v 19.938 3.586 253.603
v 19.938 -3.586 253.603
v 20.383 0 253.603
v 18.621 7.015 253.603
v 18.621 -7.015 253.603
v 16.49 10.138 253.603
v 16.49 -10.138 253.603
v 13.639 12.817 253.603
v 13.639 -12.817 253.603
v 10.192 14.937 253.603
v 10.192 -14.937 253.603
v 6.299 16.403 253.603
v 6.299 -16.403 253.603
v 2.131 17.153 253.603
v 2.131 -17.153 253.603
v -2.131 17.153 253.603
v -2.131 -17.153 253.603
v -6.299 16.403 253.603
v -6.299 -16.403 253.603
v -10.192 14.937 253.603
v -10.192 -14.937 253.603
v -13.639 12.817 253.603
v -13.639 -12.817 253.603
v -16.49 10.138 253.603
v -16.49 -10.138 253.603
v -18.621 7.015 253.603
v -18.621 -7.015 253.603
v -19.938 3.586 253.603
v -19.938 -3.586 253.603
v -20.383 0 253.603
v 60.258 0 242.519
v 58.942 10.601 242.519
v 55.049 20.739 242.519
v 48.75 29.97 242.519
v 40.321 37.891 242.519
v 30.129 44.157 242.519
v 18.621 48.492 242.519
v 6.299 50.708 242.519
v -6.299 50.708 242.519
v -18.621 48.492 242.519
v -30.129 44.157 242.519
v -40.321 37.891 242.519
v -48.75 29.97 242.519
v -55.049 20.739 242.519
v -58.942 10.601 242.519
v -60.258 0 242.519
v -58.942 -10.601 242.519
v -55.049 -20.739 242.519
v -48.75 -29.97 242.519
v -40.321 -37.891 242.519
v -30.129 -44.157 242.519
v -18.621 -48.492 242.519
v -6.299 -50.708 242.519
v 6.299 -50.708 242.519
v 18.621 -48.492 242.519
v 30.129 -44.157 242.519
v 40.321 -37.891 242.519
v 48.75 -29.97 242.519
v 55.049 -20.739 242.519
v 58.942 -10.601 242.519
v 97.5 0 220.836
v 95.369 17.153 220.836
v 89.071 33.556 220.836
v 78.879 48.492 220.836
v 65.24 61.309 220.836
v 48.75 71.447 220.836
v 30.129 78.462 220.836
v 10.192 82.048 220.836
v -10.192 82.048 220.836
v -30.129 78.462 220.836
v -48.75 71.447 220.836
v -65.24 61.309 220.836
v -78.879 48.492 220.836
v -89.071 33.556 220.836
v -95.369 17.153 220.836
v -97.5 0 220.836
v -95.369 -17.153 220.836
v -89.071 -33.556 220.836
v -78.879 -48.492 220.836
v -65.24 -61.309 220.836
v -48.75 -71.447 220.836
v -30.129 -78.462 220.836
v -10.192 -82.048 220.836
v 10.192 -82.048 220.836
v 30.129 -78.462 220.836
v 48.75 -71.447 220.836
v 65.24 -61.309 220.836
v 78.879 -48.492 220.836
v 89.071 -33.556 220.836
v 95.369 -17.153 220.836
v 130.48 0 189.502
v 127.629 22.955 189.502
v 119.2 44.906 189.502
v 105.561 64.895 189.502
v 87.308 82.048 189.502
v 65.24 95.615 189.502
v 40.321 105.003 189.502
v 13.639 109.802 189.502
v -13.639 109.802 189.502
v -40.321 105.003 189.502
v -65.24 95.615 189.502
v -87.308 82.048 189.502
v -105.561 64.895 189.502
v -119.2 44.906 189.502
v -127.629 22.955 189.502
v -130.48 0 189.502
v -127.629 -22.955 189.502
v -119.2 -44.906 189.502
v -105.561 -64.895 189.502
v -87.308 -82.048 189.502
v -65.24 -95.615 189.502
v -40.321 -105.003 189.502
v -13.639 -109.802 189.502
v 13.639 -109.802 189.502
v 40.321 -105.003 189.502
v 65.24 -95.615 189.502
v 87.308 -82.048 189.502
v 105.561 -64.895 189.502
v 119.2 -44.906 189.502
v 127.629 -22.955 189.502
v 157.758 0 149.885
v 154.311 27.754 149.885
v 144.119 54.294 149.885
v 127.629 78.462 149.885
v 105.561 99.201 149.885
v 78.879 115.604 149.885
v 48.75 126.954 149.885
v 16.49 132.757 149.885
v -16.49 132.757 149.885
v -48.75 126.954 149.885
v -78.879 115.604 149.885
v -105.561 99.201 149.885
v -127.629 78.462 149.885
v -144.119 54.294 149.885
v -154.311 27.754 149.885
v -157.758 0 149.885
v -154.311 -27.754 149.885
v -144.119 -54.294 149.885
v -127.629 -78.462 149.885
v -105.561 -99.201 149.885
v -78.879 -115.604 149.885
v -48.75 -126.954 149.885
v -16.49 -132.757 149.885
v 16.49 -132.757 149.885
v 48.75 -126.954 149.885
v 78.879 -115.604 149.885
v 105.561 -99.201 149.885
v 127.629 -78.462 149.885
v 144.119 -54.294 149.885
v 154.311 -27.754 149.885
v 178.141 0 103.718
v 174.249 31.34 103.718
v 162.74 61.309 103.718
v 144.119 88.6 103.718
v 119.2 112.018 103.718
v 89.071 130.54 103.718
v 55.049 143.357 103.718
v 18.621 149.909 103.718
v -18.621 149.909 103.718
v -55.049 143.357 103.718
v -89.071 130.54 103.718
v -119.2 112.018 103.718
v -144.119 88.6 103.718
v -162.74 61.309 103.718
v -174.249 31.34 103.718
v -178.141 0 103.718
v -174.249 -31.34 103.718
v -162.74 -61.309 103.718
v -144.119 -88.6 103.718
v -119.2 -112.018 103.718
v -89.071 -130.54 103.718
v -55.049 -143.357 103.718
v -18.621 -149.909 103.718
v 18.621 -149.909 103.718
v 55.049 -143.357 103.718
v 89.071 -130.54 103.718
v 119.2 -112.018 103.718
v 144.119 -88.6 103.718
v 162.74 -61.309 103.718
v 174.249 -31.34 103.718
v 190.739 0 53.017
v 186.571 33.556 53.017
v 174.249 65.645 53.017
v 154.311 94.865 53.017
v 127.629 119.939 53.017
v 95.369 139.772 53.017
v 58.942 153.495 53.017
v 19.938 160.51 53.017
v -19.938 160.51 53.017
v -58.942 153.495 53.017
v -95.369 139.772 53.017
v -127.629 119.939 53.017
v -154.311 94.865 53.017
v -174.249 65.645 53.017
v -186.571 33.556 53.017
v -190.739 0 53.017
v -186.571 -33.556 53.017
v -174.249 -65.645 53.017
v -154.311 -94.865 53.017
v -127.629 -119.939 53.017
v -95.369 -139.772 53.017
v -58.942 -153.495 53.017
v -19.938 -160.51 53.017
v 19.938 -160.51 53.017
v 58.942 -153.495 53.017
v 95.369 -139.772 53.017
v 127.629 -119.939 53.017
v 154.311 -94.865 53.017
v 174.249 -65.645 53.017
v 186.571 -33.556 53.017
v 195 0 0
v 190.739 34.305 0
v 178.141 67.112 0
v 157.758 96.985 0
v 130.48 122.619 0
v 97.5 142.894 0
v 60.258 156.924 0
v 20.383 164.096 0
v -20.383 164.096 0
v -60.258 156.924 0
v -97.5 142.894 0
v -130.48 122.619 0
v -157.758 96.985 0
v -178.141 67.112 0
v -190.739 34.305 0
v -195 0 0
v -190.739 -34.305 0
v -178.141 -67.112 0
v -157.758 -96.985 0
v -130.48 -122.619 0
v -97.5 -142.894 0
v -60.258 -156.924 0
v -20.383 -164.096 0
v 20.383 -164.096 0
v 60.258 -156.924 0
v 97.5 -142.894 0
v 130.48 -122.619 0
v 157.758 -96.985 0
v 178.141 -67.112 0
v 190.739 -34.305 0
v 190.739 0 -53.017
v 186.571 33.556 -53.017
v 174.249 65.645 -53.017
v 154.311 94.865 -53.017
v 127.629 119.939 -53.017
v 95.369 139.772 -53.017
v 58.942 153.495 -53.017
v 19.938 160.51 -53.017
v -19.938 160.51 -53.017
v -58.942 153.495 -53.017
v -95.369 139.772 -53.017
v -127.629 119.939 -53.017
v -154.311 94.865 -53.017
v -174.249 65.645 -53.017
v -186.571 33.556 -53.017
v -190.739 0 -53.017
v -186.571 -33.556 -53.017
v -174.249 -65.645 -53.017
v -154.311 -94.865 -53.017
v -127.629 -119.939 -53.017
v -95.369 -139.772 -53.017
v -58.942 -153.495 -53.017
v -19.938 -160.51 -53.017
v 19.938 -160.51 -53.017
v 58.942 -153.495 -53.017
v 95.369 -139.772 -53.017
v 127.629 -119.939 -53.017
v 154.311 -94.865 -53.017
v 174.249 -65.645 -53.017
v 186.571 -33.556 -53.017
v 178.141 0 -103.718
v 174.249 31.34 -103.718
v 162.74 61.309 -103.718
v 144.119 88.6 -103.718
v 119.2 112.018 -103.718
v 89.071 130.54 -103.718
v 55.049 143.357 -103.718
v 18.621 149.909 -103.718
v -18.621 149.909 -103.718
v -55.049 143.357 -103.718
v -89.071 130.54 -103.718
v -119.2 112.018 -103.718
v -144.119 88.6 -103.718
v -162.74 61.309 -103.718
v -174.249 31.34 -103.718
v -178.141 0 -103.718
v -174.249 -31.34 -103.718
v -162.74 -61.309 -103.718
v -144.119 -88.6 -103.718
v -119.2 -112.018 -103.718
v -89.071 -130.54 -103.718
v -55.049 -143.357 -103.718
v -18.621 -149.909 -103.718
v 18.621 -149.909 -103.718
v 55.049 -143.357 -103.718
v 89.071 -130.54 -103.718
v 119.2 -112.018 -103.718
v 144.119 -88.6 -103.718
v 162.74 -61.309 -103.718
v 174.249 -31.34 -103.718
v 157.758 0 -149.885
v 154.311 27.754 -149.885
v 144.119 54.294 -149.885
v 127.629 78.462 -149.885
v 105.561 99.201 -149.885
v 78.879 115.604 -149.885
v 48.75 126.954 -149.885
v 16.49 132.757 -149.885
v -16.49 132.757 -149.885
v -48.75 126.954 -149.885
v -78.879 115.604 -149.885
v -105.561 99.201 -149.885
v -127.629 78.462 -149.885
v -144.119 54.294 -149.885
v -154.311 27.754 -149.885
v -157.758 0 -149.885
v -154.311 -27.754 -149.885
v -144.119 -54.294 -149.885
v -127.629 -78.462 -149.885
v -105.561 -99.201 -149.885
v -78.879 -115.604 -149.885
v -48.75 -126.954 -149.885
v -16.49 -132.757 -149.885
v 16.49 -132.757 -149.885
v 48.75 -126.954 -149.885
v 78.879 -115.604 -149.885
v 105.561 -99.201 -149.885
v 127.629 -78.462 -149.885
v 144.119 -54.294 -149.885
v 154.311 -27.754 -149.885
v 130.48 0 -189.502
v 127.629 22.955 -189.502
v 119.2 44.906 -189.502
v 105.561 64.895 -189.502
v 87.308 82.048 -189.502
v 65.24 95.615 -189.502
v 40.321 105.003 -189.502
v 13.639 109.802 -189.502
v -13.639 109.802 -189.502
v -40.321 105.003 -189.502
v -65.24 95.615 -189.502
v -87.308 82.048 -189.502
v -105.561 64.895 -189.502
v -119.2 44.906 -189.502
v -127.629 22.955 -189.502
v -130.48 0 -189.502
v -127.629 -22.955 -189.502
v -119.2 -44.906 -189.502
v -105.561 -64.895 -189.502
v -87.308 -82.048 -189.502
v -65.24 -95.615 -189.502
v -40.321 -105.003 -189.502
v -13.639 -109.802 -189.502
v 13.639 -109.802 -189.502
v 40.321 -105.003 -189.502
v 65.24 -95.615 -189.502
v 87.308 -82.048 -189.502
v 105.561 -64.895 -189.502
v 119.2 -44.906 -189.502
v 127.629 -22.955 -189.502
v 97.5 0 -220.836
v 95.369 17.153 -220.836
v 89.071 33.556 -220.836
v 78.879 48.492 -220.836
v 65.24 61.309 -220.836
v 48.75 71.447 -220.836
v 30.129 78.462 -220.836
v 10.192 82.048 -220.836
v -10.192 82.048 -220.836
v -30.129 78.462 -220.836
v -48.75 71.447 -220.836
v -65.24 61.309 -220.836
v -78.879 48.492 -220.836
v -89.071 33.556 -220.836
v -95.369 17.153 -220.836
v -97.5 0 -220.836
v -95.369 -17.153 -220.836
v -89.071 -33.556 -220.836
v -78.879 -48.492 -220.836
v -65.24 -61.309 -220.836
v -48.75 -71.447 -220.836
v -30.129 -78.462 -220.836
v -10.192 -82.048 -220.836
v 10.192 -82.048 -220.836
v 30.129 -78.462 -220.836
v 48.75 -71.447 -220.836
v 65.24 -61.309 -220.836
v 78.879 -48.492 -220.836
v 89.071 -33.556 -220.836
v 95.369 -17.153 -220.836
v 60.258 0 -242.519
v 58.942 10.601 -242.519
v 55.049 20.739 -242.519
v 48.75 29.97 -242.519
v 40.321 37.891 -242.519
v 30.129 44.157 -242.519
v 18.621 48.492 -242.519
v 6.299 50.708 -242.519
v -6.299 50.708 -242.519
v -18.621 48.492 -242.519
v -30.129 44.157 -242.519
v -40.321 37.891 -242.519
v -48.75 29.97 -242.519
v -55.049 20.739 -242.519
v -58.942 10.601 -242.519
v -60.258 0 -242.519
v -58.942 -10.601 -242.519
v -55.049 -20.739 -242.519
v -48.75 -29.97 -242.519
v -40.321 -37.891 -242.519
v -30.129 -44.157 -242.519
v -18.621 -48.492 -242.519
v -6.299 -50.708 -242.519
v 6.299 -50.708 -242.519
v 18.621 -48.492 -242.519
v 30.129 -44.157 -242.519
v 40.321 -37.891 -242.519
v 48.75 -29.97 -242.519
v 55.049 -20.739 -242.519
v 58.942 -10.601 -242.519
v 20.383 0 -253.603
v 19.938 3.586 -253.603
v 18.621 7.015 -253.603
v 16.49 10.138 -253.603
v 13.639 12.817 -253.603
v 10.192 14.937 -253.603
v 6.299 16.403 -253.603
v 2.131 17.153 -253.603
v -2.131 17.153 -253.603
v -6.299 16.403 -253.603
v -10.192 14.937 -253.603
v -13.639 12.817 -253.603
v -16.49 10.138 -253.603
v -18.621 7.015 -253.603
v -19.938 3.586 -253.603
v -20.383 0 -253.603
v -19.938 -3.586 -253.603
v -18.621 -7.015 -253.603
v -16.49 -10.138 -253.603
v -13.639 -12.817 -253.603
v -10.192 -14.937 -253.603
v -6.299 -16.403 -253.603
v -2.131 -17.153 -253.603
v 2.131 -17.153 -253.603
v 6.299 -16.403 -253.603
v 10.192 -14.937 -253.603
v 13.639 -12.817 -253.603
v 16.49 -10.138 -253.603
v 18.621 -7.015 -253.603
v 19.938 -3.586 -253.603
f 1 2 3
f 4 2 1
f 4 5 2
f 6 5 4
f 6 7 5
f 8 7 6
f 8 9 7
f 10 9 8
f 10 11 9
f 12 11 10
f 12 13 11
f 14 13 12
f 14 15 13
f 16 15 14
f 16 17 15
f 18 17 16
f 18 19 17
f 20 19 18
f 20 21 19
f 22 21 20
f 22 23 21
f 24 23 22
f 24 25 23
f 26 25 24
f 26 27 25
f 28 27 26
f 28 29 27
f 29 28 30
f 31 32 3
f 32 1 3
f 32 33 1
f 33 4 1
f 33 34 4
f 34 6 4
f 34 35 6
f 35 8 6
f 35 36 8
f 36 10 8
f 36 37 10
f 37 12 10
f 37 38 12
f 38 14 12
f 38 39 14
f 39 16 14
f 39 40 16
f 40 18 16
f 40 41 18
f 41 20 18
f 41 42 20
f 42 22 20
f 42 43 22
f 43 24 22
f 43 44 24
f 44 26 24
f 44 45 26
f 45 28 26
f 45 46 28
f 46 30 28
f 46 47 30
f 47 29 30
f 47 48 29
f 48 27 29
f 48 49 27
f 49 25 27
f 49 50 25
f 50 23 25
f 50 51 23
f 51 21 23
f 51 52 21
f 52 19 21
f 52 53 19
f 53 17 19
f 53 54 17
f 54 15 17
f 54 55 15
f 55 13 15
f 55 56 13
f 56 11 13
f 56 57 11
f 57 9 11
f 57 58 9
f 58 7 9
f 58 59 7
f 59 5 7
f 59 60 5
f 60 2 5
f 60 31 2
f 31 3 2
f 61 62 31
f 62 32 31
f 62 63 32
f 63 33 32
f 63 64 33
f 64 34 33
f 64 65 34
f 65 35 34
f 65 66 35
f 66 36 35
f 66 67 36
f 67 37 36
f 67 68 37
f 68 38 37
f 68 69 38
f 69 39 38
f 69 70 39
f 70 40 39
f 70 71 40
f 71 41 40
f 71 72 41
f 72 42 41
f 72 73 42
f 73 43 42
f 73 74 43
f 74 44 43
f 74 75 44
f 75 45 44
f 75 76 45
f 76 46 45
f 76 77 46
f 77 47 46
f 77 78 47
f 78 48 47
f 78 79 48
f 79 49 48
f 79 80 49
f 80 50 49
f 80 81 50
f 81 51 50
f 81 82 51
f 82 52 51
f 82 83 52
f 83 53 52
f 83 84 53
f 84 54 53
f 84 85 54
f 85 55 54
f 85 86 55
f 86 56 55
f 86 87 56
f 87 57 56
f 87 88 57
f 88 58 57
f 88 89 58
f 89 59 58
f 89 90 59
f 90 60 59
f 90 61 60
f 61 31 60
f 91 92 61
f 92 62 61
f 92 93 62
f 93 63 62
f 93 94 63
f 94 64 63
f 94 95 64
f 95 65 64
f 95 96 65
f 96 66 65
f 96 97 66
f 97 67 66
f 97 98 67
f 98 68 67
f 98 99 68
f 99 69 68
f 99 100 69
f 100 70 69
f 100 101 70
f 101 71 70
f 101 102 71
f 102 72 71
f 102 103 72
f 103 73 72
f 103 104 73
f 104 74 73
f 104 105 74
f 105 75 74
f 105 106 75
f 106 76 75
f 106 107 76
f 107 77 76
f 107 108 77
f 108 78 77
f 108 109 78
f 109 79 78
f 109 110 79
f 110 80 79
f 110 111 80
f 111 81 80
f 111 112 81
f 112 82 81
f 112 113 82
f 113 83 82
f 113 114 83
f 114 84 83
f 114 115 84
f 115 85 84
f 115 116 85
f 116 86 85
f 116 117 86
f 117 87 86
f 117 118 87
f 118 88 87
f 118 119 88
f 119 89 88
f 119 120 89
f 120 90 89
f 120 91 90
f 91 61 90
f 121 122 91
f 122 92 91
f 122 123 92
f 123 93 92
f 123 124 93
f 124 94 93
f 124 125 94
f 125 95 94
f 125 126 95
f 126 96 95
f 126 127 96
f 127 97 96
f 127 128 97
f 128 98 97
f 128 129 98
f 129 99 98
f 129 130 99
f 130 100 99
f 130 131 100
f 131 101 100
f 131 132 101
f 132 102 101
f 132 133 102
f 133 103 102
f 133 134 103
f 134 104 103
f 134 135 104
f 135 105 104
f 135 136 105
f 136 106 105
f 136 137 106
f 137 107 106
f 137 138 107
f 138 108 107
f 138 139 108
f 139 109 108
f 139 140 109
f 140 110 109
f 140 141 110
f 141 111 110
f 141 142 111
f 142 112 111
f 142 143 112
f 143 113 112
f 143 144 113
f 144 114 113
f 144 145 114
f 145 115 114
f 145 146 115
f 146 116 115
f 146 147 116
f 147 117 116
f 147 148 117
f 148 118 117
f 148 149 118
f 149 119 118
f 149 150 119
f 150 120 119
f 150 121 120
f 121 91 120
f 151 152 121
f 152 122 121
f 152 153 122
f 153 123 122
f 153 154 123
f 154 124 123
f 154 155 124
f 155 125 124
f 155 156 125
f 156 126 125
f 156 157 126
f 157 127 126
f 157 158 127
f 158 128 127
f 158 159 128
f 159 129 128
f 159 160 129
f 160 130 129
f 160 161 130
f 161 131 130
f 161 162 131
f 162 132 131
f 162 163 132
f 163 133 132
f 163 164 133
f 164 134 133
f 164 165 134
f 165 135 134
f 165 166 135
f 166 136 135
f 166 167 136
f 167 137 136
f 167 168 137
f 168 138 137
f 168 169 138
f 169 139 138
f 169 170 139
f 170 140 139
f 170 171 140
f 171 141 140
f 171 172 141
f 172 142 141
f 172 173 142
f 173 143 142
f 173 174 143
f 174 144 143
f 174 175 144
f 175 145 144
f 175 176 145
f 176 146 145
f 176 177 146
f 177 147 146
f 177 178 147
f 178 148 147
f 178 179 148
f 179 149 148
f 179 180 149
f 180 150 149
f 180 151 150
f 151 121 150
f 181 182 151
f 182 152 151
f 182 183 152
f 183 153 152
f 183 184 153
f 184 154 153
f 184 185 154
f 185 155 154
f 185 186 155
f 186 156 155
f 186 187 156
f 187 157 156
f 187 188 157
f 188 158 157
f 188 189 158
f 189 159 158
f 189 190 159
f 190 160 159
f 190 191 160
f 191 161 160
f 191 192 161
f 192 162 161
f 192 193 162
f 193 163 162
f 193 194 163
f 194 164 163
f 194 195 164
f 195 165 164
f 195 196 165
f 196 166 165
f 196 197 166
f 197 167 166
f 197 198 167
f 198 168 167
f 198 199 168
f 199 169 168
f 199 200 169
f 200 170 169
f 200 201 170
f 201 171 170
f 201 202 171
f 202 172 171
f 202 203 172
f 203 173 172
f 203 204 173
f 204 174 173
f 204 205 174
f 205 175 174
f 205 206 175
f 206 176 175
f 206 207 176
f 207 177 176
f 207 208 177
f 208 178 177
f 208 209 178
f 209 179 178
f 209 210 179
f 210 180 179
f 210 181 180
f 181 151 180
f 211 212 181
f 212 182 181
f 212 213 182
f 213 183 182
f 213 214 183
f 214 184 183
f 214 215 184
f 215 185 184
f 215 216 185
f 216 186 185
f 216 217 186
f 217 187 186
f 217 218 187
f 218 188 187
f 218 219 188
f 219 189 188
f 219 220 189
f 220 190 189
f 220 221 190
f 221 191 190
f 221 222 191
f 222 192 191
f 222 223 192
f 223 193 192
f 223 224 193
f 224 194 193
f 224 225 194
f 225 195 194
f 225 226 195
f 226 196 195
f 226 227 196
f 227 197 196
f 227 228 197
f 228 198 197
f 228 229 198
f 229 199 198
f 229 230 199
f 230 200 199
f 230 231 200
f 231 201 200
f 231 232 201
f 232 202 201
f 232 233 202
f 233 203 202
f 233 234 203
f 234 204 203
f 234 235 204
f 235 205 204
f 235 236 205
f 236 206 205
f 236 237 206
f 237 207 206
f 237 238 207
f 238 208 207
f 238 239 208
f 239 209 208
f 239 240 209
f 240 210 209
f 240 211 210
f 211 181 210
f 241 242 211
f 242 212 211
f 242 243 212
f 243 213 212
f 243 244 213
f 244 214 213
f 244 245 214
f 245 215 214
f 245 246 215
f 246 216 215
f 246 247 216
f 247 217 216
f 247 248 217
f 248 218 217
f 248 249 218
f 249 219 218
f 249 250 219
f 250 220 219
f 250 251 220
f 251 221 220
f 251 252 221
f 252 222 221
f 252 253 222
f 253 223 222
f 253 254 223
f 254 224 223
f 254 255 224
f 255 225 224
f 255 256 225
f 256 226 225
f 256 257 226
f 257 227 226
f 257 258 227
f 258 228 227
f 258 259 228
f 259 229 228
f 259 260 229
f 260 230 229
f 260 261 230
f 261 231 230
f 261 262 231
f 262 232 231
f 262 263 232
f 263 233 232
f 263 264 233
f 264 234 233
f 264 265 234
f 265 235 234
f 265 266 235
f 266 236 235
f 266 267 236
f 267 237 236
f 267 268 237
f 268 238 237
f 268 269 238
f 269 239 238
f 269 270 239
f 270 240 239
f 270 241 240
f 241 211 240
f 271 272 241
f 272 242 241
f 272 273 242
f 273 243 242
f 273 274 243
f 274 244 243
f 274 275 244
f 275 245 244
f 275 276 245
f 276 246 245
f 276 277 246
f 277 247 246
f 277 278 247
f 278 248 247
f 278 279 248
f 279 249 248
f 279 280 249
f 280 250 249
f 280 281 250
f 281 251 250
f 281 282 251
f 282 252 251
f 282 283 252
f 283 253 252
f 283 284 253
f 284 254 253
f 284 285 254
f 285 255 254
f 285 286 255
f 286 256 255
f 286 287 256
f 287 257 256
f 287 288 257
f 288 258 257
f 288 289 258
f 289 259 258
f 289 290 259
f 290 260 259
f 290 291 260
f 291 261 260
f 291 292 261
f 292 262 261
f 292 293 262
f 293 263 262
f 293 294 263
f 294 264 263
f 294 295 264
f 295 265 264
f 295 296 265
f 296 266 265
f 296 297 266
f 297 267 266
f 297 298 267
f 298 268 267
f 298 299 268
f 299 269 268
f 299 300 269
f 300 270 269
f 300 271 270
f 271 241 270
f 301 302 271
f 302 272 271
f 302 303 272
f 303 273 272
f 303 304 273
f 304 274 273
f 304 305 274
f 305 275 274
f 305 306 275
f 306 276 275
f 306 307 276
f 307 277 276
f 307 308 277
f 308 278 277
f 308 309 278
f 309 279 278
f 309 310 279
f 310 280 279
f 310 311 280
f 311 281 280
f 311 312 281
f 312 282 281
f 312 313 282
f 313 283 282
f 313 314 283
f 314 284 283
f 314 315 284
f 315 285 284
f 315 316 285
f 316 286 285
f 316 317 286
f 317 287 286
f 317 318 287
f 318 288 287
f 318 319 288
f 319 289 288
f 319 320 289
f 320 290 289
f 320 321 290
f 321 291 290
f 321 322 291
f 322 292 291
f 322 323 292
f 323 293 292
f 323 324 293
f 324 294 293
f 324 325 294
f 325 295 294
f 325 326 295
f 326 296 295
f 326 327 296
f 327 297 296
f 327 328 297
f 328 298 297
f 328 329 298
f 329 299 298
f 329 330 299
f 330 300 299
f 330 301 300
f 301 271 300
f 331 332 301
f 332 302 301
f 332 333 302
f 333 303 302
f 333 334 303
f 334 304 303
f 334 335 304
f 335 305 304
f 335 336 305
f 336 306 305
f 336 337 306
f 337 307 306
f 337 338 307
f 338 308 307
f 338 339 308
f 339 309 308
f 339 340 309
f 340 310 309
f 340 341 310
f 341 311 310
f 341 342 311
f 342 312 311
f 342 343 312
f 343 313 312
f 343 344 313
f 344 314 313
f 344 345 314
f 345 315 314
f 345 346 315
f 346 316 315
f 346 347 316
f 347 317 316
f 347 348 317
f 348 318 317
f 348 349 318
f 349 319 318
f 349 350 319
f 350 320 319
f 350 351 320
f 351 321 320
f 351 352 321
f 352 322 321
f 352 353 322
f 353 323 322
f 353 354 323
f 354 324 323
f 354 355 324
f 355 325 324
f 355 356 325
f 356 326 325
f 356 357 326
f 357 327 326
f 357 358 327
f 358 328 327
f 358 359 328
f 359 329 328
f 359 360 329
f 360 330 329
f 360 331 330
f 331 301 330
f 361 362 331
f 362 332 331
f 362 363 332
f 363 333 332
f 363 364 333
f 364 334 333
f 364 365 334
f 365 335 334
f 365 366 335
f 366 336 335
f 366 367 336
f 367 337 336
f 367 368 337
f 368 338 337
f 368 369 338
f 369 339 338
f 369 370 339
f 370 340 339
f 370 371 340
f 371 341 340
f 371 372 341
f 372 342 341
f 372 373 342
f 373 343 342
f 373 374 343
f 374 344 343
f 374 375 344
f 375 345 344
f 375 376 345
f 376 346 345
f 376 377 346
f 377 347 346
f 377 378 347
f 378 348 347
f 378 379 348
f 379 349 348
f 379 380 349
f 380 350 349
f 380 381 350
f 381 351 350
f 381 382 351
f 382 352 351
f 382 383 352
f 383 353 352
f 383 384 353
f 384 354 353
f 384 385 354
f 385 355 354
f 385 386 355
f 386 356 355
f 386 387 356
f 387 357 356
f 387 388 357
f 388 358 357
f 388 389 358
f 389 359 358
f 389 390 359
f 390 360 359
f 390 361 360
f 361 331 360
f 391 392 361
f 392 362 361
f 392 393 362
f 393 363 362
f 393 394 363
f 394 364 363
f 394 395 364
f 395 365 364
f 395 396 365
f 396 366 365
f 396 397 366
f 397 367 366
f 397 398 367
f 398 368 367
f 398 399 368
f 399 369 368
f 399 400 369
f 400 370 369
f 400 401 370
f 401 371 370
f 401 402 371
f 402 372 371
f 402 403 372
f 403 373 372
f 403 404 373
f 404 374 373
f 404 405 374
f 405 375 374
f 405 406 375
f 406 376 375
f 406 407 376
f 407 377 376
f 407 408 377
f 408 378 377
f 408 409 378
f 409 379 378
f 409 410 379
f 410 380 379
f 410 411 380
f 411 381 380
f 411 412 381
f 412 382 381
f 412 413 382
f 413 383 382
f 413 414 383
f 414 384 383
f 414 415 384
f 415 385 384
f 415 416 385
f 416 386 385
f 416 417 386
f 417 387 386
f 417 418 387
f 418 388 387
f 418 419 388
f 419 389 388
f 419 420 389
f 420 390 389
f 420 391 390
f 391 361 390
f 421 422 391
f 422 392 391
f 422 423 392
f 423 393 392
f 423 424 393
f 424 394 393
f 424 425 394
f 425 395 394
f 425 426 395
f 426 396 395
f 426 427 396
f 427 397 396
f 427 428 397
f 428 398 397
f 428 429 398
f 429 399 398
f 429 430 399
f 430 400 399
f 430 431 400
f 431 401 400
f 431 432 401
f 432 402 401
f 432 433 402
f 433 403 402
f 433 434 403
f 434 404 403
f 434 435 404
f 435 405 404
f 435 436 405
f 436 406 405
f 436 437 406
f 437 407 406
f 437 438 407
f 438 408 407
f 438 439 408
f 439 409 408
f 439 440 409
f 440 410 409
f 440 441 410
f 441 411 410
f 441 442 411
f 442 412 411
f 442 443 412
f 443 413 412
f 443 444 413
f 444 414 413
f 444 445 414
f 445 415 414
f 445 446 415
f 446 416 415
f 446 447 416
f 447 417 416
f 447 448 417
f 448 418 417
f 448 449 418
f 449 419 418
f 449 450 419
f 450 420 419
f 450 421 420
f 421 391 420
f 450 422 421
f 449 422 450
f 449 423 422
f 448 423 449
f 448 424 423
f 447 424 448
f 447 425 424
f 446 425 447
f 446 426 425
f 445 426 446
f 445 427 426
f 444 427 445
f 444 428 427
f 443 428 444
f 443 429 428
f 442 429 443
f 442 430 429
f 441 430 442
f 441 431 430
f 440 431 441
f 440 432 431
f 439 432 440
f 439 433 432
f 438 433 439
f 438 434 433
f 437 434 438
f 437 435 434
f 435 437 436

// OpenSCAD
// Generated by SolidPython 1.0.1 on 2020-07-29 00:46:51


scale(v = [13, 11, 17]) {
	sphere(r = 15);
}
/***********************************************
*********      SolidPython code:      **********
************************************************
 
# import packages: SolidPython
from solid import *
from solid.utils import *
from itertools import chain, combinations, permutations


class Resize:

    def __init__(self, scad_file):
        self.scad_file = scad_file
        #self.scad_file = import_scad(scad_file)
        # cone/cylinder param:
        self.r1 = 0
        self.r2 = 0
        self.h = 0
        # rectangular prism param:
        self.w = 0
        self.l = 0
        # ellipse param:
        self.r = 0

    # import OpenScad code (file name corresponds to shape)


    # classify shape + parameters
    def assign(self, param1, param2, param3):
        if self.scad_file == 'cone.scad':
            self.r1 = param1
            self.r2 = param2
            self.h = param3
        elif self.scad_file == 'cylinder.scad':
            self.r1 = param1
            self.r2 = param2
            self.h = param3
        elif self.scad_file == 'rectangularPrism.scad':
            self.h = param1
            self.l = param2
            self.w = param3
        else:
            self.r = param1
            self.h = param2

    # resize parameters
    def iterate(self):
        x = range(3, 20, 2)
        i = 1
        if self.scad_file == 'cone.scad':
            tempList = list(permutations(x, 2))
            for temp in tempList:
                param1 = temp[0]
                param2 = temp[1]
                filepath = 'produced_scad_files/' + 'cone' + str(param1) + '_' + str(param2) + '_' + '.scad'
                scad_render_to_file(cylinder(h=param1, r1=param2, r2=0), filepath)

        elif self.scad_file == 'cylinder.scad':
            tempList = list(permutations(x, 3))
            for temp in tempList:
                param1 = temp[0]
                param2 = temp[1]
                filepath = 'produced_scad_files/' + 'cylinder' + str(param1) + '_' + str(param2) + '_' + '.scad'
                scad_render_to_file(cylinder(h=param1, r1=param2, r2=param2), filepath)

        elif self.scad_file == 'rectangularPrism.scad':
            tempList = list(permutations(x, 3))
            for temp in tempList:
                param1 = temp[0]
                param2 = temp[1]
                param3 = temp[2]
                filepath = 'produced_scad_files/' + 'rectangularPrism' + str(param1) + '_' + str(param2) + '_' + str(
                    param3) + '.scad'
                scad_render_to_file(cube(size=(param1, param2, param3)), filepath)

        elif self.scad_file == 'ellipse.scad':
            tempList = list(permutations(x, 4))
            for temp in tempList:
                param1 = temp[0]
                param2 = temp[1]
                param3 = temp[2]
                param4 = temp[3]
                filepath = 'produced_scad_files/' + 'ellipse' + str(param1) + '_' + str(param2) + '_' + str(param3) + '_' + str(param4) + '.scad'
                scad_render_to_file(scale([param1, param2, param3])(sphere(r=param4)), filepath)

    def render_to_scadfile(self):
        scad_render_to_file(scad, 'example.scad') 
 
************************************************/
